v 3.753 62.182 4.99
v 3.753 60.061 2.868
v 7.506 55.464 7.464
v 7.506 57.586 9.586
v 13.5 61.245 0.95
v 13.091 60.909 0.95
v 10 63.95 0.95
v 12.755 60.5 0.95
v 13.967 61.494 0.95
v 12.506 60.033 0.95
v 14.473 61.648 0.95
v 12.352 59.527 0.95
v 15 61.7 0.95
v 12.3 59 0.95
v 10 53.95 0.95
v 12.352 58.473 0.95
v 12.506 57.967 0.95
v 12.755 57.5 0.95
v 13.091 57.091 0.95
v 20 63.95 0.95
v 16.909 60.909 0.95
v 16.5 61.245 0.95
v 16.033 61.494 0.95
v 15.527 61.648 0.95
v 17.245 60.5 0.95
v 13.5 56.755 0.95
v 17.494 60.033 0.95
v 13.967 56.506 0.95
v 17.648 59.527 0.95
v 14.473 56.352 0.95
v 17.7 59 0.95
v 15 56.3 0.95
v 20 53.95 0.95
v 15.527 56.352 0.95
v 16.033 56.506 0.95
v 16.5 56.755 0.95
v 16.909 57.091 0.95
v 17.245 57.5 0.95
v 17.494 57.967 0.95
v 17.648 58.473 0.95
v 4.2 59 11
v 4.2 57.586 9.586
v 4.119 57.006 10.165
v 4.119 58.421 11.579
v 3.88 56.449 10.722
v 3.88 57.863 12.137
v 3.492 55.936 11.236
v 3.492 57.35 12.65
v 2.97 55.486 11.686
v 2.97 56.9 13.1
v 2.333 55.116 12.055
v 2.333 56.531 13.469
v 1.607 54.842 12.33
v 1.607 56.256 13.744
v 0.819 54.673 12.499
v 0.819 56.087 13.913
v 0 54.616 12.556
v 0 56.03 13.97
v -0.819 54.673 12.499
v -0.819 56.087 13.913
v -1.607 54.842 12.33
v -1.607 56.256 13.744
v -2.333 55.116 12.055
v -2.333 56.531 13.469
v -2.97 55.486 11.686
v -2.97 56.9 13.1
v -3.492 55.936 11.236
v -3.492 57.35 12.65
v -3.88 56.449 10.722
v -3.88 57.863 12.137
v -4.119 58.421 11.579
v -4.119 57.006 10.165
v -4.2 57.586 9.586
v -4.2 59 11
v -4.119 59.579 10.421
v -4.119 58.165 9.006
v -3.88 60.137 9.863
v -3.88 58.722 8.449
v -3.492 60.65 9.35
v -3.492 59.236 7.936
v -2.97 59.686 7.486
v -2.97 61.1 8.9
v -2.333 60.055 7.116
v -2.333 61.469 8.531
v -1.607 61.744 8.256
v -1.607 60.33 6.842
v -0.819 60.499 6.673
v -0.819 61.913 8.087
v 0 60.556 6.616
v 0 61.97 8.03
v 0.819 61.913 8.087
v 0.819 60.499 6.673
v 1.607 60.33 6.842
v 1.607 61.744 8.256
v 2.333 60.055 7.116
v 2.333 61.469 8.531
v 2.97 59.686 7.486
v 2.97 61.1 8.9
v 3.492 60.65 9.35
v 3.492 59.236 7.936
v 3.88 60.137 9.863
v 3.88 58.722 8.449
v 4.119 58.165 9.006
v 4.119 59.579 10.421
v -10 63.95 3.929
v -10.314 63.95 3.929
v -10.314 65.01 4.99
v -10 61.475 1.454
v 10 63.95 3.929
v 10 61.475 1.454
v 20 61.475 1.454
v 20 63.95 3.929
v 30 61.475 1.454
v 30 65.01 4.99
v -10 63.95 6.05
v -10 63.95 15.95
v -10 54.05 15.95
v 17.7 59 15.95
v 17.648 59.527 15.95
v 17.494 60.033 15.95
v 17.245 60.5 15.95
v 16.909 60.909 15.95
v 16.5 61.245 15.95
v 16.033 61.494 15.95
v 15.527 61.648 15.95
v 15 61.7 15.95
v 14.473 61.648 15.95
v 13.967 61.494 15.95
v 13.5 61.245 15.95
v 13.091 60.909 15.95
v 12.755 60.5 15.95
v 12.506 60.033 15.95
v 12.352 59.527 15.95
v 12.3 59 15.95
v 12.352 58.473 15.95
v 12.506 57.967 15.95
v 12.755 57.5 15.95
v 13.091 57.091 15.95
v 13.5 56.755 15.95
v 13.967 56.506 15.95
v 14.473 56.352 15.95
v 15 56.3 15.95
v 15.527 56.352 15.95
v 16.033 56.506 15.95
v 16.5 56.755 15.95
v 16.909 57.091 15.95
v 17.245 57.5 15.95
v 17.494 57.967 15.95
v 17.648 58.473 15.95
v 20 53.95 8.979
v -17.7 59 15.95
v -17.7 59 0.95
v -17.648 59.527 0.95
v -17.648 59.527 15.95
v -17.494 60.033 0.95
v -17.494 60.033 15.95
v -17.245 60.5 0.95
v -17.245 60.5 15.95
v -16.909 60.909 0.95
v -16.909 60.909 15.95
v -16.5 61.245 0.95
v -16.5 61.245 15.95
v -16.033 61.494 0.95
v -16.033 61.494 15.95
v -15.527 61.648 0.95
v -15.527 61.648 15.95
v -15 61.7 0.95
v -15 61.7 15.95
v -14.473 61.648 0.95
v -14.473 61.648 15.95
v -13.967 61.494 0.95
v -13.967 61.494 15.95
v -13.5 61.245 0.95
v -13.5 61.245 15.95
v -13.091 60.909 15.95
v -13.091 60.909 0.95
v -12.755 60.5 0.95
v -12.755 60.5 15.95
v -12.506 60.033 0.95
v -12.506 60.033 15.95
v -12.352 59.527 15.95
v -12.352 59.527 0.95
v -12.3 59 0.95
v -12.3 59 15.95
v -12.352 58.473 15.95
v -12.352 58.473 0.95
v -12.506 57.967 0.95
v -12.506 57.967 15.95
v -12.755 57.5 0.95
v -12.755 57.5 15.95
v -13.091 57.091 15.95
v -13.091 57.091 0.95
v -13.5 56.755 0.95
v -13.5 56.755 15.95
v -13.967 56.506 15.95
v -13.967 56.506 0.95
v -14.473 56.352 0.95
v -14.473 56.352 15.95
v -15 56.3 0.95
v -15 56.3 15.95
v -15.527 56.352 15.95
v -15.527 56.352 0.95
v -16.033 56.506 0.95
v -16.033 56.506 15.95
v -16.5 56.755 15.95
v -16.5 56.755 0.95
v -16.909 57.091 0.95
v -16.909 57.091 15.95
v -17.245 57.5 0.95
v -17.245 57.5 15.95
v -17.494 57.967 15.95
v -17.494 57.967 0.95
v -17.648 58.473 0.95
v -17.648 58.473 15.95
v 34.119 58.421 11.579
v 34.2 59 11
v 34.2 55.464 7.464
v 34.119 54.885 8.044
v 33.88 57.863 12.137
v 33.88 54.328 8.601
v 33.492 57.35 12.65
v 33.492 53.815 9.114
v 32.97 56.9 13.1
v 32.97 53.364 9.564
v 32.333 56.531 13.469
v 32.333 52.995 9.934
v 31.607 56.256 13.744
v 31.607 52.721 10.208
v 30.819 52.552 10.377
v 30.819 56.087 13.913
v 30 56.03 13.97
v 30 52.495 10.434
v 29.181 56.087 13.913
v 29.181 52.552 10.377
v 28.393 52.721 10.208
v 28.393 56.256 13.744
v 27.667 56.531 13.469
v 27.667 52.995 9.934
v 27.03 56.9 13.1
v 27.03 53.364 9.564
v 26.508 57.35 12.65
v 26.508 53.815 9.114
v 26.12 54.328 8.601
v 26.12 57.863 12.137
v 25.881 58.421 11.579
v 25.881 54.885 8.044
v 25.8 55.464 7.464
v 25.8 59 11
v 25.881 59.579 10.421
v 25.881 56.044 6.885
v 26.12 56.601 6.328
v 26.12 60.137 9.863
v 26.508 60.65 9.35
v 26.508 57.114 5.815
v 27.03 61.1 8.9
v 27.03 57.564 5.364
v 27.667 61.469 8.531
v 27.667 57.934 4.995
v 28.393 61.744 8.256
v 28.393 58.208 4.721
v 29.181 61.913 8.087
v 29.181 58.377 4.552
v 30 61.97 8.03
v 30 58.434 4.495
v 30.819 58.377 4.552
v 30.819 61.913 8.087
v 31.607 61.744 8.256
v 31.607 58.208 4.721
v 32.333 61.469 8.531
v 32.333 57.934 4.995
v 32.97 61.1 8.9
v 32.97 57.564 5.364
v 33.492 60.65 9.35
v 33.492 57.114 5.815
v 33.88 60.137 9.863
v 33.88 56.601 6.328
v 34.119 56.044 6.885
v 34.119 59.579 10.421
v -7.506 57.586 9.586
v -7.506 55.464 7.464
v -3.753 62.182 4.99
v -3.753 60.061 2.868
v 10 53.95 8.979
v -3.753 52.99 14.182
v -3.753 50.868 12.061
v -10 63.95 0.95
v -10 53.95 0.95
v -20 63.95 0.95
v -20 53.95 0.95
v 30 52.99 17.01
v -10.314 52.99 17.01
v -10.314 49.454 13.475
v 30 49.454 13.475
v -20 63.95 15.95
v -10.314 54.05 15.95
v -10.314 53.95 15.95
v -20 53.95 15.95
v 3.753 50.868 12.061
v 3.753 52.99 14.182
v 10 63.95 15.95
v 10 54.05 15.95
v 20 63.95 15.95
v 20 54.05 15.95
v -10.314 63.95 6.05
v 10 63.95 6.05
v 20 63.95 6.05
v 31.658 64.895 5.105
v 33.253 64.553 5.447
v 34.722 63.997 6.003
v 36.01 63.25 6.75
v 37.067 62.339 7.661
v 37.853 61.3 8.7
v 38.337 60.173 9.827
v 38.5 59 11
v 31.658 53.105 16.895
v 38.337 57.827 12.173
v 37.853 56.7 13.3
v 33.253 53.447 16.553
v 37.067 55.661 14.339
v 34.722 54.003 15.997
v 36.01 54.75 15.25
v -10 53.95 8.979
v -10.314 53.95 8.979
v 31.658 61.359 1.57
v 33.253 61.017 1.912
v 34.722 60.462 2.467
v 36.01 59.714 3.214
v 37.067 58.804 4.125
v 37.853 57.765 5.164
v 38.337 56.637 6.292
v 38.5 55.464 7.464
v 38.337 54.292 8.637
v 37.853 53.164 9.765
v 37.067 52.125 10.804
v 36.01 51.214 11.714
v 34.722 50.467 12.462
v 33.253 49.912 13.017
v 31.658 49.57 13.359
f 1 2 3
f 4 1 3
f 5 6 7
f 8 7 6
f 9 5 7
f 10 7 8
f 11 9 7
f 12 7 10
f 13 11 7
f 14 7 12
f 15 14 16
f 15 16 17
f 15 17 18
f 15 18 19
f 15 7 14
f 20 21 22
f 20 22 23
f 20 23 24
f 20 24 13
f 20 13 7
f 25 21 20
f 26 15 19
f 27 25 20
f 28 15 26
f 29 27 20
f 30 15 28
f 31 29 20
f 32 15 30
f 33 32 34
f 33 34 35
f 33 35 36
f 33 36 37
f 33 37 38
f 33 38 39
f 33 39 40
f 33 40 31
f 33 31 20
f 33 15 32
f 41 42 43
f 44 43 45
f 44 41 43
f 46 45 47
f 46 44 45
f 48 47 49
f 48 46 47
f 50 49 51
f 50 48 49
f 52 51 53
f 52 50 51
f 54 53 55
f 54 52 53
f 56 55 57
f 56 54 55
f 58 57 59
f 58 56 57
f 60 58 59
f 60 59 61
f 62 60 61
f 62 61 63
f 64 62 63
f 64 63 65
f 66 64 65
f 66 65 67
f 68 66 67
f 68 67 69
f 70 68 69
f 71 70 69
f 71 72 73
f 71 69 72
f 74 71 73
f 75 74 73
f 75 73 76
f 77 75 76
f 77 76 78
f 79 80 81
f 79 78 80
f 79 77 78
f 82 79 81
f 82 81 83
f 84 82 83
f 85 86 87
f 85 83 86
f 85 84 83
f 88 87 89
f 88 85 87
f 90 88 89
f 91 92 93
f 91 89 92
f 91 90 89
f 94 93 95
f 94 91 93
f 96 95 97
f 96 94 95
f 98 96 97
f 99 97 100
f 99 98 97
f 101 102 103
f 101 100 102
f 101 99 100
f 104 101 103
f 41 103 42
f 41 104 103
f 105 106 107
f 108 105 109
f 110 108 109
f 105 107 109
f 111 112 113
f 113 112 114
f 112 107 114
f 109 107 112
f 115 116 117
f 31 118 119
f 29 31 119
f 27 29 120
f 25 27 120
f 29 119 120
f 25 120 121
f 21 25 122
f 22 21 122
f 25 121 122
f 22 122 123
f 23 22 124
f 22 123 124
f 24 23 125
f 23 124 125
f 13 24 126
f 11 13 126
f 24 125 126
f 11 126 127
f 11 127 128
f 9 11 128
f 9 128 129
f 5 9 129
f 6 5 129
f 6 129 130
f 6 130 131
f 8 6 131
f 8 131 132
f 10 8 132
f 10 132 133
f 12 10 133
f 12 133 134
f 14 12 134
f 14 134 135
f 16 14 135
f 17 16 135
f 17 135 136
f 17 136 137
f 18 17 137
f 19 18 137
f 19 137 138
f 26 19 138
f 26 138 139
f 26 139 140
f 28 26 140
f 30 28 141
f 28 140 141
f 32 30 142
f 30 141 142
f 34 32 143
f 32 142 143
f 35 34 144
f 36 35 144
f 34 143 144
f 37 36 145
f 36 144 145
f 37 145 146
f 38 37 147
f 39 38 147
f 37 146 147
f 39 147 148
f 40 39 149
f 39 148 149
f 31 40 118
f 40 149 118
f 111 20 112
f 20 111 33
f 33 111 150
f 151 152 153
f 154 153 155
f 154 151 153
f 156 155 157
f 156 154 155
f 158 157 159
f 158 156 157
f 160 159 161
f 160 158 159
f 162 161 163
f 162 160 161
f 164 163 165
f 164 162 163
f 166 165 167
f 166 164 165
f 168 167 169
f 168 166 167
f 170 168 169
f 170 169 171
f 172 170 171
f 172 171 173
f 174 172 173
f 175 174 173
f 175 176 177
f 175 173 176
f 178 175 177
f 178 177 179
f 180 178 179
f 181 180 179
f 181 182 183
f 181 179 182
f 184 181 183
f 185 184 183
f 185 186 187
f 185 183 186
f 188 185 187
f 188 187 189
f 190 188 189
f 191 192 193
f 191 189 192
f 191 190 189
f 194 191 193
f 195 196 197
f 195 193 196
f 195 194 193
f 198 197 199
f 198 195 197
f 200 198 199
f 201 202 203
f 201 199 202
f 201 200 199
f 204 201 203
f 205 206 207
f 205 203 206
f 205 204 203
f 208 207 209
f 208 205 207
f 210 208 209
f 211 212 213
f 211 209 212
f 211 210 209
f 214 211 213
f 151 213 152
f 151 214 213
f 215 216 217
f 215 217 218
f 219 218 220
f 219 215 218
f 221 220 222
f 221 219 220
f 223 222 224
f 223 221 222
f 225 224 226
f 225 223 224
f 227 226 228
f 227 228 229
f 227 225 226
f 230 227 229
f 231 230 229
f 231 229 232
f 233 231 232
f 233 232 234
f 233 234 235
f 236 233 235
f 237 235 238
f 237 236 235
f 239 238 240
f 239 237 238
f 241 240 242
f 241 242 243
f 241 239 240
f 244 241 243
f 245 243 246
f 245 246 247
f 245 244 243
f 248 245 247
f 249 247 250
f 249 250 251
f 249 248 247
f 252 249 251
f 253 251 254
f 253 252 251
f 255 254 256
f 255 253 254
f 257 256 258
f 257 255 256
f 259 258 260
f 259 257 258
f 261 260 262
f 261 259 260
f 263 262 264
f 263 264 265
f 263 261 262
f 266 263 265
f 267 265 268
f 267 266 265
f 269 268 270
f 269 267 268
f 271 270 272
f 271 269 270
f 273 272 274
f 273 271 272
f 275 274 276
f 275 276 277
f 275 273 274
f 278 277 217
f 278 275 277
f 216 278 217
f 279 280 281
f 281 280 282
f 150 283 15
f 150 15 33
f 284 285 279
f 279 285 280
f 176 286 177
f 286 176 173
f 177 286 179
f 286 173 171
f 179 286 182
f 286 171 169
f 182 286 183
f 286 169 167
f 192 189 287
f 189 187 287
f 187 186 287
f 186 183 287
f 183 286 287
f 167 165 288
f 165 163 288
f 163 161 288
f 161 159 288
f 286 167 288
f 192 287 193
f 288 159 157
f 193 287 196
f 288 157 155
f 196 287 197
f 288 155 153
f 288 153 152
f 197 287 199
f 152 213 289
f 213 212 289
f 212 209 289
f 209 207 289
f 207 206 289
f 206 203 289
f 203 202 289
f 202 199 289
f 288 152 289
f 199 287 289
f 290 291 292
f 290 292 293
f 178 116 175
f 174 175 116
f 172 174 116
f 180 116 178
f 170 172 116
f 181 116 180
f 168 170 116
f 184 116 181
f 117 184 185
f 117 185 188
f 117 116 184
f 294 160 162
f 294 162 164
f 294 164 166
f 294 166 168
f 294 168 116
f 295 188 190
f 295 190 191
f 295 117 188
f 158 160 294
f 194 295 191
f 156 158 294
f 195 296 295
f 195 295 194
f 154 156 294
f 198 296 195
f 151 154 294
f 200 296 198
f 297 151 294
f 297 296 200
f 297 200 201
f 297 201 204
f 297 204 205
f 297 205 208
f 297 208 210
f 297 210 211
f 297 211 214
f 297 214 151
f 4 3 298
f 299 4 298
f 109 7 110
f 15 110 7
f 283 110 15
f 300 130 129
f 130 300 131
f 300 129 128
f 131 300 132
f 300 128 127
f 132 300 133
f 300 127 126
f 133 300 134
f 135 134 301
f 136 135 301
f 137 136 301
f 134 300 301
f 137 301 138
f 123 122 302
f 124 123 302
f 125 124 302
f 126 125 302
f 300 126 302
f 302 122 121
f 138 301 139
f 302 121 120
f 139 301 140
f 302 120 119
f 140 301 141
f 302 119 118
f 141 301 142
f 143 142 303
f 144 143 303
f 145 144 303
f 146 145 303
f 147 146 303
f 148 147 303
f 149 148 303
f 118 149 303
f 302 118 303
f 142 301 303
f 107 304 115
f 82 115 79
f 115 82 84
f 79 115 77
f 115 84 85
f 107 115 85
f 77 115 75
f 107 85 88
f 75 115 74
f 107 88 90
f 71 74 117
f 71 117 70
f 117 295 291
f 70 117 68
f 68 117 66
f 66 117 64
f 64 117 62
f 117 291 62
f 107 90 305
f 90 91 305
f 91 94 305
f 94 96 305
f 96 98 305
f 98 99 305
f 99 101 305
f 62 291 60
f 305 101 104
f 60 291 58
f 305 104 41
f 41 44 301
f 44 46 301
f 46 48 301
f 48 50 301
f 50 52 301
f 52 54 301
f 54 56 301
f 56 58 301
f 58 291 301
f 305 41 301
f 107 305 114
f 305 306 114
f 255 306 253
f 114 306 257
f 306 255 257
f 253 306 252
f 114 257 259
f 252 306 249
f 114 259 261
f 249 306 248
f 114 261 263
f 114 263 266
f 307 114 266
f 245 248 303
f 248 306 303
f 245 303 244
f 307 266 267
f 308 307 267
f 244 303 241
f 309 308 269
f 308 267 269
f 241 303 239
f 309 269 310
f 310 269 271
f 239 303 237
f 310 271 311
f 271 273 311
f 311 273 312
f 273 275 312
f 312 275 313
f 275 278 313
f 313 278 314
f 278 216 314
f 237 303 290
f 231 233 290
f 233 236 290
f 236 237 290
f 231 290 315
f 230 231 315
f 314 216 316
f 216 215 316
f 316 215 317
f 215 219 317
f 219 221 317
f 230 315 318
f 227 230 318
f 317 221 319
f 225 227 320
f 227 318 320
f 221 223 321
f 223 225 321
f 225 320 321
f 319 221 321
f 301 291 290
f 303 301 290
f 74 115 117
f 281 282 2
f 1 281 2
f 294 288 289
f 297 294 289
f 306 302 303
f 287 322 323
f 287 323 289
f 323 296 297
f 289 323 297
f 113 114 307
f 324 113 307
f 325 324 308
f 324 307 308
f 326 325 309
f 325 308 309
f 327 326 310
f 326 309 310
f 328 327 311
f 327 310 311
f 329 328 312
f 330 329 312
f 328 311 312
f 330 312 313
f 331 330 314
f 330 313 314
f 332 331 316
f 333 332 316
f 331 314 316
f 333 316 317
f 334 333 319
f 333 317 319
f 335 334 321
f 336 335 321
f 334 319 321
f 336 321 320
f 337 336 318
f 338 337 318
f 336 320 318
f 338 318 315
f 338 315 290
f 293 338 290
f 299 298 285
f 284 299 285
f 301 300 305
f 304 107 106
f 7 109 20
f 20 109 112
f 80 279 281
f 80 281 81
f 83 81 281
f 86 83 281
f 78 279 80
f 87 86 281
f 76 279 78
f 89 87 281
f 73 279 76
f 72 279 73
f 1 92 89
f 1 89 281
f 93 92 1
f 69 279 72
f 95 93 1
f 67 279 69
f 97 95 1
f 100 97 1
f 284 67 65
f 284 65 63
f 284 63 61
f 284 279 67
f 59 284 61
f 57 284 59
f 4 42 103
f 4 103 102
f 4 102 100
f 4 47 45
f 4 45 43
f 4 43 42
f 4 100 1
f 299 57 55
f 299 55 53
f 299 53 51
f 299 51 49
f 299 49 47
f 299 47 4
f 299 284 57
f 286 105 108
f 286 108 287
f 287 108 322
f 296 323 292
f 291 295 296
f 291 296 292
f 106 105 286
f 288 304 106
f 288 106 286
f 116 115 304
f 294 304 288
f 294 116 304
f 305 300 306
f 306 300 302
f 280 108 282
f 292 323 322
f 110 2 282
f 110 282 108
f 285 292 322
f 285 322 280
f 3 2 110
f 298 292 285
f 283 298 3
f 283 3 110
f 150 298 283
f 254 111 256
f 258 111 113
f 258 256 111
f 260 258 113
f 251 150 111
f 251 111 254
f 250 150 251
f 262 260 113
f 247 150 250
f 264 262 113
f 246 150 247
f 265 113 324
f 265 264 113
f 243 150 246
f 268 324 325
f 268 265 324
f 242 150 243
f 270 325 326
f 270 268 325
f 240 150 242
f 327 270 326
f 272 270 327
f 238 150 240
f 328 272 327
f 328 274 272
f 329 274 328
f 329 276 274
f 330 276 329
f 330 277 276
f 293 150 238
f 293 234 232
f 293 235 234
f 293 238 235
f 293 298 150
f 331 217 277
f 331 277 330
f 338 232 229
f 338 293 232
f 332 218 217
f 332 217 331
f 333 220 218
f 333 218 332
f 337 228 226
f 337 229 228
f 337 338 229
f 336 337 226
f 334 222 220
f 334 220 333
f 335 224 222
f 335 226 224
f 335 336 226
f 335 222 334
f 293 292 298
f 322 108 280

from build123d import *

# Parameters (mm, degrees)
SKETCH039_R             = 4.2
PAD019_DEPTH            = 5
BOX_W                   = 10
BOX_H                   = 10
BOX_DEPTH               = 15
POCKET011_DEPTH         = 3
SKETCH041_R             = 2.7
POCKET012_DEPTH         = 130.641501891
BODY007_PLACEMENT_ANGLE = 45


with BuildPart() as part:
    # Sketch039 → Pad019 (new body)
    with BuildSketch(Plane.XZ):
        with BuildLine():
            ThreePointArc((30, -8.5), (38.5, 0), (30, 8.5))
            Line((0, 8.5), (30, 8.5))
            Line((-10.313604, 8.5), (0, 8.5))
            Line((-10.313604, -8.5), (-10.313604, 8.5))
            Line((0, -8.5), (-10.313604, -8.5))
            Line((0, -8.5), (30, -8.5))
        make_face()
        Circle(SKETCH039_R, mode=Mode.SUBTRACT)
        with Locations((30, 0)):
            Circle(SKETCH039_R, mode=Mode.SUBTRACT)
    extrude(amount=PAD019_DEPTH)

    # Box → Box (join)
    with BuildSketch(Plane(origin=(10, 7, 0), x_dir=(1, 0, 0), z_dir=(0, -0.7071067812, -0.7071067812))):
        with Locations((5, 5)):
            Rectangle(BOX_W, BOX_H)
    box = extrude(amount=BOX_DEPTH)

    # Sketch040 (on Face5 of Box) → Pocket011 (cut)
    with BuildSketch(Plane(origin=(10, -5, 0), x_dir=(1, 0, 0), z_dir=(0, -1, 0))):
        Polygon((-6.2472232503, 6.5), (-13.7527767497, 6.5), (-17.5055534995, 0), (-13.7527767497, -6.5), (-6.2472232503, -6.5), (-2.4944465005, 0), align=None)
    extrude(amount=-POCKET011_DEPTH, mode=Mode.SUBTRACT)

    # Sketch041 (on Face15 of Pocket011) → Pocket012 (cut, through all)
    with BuildSketch(Plane(origin=(10, 7, 0), x_dir=(1, 0, 0), z_dir=(0, 0.7071067812, 0.7071067812))):
        with Locations((5, -4.9497474683)):
            Circle(SKETCH041_R)
    pocket012 = extrude(amount=-POCKET012_DEPTH, mode=Mode.SUBTRACT)

    # Mirrored010: Box, Pocket012 across YZ
    add(box.mirror(Plane.YZ))
    add(pocket012.mirror(Plane.YZ), mode=Mode.SUBTRACT)


with BuildPart() as part_1:
    # Body007 placement: moved
    add(part.part.moved(Location((0, 59, 11))).rotate(Axis((0, 59, 11), (1, 0, 0)), BODY007_PLACEMENT_ANGLE))


solid = part_1.part
